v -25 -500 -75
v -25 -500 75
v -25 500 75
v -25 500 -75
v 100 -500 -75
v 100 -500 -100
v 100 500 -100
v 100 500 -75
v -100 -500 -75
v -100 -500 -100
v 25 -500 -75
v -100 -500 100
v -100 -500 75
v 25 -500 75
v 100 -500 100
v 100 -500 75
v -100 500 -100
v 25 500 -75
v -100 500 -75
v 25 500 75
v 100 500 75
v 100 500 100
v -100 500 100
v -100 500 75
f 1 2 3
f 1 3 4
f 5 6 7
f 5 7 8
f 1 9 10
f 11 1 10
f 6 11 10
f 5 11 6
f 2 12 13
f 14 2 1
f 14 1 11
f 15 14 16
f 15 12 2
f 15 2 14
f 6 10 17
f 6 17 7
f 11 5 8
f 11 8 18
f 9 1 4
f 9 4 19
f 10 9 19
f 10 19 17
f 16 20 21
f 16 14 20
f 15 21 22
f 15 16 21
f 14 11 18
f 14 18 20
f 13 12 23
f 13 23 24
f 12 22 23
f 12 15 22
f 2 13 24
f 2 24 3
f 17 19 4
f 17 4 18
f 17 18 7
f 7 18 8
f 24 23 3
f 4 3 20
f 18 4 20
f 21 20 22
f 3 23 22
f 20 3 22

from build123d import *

# Parameters (mm, degrees)
F1_DEPTH = 500


with BuildPart() as f1:
    # F0 (on Front) → F1 (new body, symmetric)
    with BuildSketch(Plane.XZ):
        Polygon((100, 100), (0, 100), (-100, 100), (-100, 75), (-25, 75), (-25, 0), (-25, -75), (-100, -75), (-100, -100), (0, -100), (100, -100), (100, -75), (25, -75), (25, 0), (25, 75), (100, 75), align=None)
    extrude(amount=F1_DEPTH, both=True)


solid = f1.part
